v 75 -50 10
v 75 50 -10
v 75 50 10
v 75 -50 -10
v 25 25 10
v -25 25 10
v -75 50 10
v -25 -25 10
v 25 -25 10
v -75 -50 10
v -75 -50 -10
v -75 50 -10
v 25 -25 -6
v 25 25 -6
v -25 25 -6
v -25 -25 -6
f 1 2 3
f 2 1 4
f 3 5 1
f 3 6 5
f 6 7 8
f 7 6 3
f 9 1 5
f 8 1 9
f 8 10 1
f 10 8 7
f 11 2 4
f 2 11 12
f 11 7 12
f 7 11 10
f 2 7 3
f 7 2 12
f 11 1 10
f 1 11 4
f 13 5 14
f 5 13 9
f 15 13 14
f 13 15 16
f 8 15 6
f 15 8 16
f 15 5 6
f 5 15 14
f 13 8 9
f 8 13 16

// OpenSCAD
module case (){
    difference(){
        cube([150,100,20], center = true);
        translate([0,0,5])
        cube([50,50,22], center = true);
    }
}

case();
